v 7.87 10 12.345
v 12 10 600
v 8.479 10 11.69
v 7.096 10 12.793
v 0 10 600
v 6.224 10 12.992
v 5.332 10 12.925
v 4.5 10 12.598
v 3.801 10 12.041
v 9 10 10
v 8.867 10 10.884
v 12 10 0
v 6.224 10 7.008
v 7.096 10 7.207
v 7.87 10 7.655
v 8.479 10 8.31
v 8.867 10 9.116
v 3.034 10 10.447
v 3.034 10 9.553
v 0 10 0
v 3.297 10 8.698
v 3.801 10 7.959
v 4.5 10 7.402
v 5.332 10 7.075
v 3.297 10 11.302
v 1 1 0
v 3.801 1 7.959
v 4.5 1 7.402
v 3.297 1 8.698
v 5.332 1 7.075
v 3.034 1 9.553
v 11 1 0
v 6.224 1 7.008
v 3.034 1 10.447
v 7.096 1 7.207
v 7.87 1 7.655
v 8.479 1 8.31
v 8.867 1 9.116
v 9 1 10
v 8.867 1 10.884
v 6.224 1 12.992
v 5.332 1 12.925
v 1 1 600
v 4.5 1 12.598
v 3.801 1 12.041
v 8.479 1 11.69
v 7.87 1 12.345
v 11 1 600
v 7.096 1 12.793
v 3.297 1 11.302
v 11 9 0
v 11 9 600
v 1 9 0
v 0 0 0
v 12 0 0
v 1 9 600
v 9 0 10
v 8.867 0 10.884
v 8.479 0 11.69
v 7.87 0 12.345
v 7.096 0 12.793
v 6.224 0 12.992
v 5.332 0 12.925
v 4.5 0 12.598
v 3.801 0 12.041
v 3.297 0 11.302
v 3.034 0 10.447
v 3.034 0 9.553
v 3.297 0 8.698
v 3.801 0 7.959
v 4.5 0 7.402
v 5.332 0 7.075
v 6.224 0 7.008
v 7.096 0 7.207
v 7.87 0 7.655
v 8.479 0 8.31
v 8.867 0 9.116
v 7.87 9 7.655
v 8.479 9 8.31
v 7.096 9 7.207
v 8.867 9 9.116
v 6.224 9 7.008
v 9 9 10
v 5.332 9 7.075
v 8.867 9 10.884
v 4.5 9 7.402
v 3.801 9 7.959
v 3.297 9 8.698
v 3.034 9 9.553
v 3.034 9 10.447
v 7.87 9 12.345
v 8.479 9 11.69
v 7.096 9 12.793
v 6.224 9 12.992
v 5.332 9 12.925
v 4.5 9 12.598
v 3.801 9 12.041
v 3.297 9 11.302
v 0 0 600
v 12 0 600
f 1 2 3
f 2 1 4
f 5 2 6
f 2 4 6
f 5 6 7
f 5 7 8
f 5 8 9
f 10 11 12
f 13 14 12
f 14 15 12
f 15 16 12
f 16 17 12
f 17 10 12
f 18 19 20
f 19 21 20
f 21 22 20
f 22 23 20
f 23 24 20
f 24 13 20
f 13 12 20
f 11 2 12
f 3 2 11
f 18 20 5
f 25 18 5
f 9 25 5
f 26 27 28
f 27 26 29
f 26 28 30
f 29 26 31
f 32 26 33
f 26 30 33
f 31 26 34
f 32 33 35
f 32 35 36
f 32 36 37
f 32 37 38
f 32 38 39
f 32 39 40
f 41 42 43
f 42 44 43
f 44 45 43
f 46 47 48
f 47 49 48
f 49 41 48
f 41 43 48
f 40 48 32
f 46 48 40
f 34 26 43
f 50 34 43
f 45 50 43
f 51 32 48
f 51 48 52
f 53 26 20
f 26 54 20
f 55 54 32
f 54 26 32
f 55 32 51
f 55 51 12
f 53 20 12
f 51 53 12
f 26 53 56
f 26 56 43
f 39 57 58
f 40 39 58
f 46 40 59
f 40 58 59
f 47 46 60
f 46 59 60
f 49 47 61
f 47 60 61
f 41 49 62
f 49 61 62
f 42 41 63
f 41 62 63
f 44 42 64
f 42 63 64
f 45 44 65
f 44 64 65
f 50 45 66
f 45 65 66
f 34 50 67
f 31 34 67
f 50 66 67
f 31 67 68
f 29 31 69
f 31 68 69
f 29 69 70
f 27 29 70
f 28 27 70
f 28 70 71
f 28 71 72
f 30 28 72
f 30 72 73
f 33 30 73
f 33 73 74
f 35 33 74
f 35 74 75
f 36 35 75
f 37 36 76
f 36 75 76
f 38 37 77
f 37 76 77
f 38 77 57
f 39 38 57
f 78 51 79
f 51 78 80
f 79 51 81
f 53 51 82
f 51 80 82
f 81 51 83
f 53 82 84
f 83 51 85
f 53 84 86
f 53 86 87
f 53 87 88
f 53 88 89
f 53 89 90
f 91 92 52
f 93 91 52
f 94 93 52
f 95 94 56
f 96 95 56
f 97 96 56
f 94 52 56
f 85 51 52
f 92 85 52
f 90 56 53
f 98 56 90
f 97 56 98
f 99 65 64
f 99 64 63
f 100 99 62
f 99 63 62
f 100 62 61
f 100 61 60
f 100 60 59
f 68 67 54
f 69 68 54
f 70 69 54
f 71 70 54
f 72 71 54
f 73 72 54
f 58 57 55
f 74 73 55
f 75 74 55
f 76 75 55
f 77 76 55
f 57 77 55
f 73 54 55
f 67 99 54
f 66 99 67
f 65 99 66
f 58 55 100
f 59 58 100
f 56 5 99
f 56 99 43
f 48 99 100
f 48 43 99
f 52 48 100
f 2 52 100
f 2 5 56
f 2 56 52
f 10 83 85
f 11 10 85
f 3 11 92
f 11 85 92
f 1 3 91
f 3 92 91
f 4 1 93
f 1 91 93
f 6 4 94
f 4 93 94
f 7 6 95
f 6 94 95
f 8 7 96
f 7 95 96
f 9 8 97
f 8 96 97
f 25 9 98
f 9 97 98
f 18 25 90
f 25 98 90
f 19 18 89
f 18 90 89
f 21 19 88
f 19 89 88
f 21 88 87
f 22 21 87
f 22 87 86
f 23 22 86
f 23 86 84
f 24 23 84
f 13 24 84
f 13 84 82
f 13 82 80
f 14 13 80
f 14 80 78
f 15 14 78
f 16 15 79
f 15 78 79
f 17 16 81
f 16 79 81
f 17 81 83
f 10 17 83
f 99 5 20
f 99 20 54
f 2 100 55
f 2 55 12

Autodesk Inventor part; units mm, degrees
ref_plane "YZ Plane" through (0, 0, 0) normal (1, 0, 0) x (0, 1, 0)
ref_plane "XZ Plane" through (0, 0, 0) normal (0, 1, 0) x (-1, 0, 0)
ref_plane "XY Plane" through (0, 0, 0) normal (0, 0, 1) x (1, 0, 0)
sketch "Sketch1" plane through (0, 0, 0) normal (0, 0, 1) x (1, 0, 0)
  line L0 (0, 0) -> (12, 0)
  line L1 (12, 0) -> (12, 10)
  line L2 (12, 10) -> (0, 10)
  line L3 (0, 10) -> (0, 0)
  dimension "d0" = 12
  dimension "d1" = 10
extrude "Extrusion1" add sketch "Sketch1" along normal blind 600
sketch "Sketch3" plane through (0, 0, 600) normal (0, 0, 1) x (1, 0, 0)
  line L0 (12, 10) -> (0, 10) projected
  line L1 (1, 1) -> (11, 1)
  line L2 (11, 1) -> (11, 9)
  line L3 (11, 9) -> (1, 9)
  line L4 (1, 9) -> (1, 1)
  line L5 (11, 1) -> (1, 9) construction
  point P0 (0, 0)
  point P1 (6, 5)
extrude "Extrusion3" cut sketch "Sketch3" against normal through all
sketch "Sketch5" plane through (0, 0, 0) normal (0, -1, 0) x (1, 0, 0)
  circle A0 centre (6, 10) radius 3
  point P0 (0, 0)
  dimension "d12" = 6
extrude "Extrusion4" cut sketch "Sketch5" against normal through all
properties part number "perfil aluminio"
